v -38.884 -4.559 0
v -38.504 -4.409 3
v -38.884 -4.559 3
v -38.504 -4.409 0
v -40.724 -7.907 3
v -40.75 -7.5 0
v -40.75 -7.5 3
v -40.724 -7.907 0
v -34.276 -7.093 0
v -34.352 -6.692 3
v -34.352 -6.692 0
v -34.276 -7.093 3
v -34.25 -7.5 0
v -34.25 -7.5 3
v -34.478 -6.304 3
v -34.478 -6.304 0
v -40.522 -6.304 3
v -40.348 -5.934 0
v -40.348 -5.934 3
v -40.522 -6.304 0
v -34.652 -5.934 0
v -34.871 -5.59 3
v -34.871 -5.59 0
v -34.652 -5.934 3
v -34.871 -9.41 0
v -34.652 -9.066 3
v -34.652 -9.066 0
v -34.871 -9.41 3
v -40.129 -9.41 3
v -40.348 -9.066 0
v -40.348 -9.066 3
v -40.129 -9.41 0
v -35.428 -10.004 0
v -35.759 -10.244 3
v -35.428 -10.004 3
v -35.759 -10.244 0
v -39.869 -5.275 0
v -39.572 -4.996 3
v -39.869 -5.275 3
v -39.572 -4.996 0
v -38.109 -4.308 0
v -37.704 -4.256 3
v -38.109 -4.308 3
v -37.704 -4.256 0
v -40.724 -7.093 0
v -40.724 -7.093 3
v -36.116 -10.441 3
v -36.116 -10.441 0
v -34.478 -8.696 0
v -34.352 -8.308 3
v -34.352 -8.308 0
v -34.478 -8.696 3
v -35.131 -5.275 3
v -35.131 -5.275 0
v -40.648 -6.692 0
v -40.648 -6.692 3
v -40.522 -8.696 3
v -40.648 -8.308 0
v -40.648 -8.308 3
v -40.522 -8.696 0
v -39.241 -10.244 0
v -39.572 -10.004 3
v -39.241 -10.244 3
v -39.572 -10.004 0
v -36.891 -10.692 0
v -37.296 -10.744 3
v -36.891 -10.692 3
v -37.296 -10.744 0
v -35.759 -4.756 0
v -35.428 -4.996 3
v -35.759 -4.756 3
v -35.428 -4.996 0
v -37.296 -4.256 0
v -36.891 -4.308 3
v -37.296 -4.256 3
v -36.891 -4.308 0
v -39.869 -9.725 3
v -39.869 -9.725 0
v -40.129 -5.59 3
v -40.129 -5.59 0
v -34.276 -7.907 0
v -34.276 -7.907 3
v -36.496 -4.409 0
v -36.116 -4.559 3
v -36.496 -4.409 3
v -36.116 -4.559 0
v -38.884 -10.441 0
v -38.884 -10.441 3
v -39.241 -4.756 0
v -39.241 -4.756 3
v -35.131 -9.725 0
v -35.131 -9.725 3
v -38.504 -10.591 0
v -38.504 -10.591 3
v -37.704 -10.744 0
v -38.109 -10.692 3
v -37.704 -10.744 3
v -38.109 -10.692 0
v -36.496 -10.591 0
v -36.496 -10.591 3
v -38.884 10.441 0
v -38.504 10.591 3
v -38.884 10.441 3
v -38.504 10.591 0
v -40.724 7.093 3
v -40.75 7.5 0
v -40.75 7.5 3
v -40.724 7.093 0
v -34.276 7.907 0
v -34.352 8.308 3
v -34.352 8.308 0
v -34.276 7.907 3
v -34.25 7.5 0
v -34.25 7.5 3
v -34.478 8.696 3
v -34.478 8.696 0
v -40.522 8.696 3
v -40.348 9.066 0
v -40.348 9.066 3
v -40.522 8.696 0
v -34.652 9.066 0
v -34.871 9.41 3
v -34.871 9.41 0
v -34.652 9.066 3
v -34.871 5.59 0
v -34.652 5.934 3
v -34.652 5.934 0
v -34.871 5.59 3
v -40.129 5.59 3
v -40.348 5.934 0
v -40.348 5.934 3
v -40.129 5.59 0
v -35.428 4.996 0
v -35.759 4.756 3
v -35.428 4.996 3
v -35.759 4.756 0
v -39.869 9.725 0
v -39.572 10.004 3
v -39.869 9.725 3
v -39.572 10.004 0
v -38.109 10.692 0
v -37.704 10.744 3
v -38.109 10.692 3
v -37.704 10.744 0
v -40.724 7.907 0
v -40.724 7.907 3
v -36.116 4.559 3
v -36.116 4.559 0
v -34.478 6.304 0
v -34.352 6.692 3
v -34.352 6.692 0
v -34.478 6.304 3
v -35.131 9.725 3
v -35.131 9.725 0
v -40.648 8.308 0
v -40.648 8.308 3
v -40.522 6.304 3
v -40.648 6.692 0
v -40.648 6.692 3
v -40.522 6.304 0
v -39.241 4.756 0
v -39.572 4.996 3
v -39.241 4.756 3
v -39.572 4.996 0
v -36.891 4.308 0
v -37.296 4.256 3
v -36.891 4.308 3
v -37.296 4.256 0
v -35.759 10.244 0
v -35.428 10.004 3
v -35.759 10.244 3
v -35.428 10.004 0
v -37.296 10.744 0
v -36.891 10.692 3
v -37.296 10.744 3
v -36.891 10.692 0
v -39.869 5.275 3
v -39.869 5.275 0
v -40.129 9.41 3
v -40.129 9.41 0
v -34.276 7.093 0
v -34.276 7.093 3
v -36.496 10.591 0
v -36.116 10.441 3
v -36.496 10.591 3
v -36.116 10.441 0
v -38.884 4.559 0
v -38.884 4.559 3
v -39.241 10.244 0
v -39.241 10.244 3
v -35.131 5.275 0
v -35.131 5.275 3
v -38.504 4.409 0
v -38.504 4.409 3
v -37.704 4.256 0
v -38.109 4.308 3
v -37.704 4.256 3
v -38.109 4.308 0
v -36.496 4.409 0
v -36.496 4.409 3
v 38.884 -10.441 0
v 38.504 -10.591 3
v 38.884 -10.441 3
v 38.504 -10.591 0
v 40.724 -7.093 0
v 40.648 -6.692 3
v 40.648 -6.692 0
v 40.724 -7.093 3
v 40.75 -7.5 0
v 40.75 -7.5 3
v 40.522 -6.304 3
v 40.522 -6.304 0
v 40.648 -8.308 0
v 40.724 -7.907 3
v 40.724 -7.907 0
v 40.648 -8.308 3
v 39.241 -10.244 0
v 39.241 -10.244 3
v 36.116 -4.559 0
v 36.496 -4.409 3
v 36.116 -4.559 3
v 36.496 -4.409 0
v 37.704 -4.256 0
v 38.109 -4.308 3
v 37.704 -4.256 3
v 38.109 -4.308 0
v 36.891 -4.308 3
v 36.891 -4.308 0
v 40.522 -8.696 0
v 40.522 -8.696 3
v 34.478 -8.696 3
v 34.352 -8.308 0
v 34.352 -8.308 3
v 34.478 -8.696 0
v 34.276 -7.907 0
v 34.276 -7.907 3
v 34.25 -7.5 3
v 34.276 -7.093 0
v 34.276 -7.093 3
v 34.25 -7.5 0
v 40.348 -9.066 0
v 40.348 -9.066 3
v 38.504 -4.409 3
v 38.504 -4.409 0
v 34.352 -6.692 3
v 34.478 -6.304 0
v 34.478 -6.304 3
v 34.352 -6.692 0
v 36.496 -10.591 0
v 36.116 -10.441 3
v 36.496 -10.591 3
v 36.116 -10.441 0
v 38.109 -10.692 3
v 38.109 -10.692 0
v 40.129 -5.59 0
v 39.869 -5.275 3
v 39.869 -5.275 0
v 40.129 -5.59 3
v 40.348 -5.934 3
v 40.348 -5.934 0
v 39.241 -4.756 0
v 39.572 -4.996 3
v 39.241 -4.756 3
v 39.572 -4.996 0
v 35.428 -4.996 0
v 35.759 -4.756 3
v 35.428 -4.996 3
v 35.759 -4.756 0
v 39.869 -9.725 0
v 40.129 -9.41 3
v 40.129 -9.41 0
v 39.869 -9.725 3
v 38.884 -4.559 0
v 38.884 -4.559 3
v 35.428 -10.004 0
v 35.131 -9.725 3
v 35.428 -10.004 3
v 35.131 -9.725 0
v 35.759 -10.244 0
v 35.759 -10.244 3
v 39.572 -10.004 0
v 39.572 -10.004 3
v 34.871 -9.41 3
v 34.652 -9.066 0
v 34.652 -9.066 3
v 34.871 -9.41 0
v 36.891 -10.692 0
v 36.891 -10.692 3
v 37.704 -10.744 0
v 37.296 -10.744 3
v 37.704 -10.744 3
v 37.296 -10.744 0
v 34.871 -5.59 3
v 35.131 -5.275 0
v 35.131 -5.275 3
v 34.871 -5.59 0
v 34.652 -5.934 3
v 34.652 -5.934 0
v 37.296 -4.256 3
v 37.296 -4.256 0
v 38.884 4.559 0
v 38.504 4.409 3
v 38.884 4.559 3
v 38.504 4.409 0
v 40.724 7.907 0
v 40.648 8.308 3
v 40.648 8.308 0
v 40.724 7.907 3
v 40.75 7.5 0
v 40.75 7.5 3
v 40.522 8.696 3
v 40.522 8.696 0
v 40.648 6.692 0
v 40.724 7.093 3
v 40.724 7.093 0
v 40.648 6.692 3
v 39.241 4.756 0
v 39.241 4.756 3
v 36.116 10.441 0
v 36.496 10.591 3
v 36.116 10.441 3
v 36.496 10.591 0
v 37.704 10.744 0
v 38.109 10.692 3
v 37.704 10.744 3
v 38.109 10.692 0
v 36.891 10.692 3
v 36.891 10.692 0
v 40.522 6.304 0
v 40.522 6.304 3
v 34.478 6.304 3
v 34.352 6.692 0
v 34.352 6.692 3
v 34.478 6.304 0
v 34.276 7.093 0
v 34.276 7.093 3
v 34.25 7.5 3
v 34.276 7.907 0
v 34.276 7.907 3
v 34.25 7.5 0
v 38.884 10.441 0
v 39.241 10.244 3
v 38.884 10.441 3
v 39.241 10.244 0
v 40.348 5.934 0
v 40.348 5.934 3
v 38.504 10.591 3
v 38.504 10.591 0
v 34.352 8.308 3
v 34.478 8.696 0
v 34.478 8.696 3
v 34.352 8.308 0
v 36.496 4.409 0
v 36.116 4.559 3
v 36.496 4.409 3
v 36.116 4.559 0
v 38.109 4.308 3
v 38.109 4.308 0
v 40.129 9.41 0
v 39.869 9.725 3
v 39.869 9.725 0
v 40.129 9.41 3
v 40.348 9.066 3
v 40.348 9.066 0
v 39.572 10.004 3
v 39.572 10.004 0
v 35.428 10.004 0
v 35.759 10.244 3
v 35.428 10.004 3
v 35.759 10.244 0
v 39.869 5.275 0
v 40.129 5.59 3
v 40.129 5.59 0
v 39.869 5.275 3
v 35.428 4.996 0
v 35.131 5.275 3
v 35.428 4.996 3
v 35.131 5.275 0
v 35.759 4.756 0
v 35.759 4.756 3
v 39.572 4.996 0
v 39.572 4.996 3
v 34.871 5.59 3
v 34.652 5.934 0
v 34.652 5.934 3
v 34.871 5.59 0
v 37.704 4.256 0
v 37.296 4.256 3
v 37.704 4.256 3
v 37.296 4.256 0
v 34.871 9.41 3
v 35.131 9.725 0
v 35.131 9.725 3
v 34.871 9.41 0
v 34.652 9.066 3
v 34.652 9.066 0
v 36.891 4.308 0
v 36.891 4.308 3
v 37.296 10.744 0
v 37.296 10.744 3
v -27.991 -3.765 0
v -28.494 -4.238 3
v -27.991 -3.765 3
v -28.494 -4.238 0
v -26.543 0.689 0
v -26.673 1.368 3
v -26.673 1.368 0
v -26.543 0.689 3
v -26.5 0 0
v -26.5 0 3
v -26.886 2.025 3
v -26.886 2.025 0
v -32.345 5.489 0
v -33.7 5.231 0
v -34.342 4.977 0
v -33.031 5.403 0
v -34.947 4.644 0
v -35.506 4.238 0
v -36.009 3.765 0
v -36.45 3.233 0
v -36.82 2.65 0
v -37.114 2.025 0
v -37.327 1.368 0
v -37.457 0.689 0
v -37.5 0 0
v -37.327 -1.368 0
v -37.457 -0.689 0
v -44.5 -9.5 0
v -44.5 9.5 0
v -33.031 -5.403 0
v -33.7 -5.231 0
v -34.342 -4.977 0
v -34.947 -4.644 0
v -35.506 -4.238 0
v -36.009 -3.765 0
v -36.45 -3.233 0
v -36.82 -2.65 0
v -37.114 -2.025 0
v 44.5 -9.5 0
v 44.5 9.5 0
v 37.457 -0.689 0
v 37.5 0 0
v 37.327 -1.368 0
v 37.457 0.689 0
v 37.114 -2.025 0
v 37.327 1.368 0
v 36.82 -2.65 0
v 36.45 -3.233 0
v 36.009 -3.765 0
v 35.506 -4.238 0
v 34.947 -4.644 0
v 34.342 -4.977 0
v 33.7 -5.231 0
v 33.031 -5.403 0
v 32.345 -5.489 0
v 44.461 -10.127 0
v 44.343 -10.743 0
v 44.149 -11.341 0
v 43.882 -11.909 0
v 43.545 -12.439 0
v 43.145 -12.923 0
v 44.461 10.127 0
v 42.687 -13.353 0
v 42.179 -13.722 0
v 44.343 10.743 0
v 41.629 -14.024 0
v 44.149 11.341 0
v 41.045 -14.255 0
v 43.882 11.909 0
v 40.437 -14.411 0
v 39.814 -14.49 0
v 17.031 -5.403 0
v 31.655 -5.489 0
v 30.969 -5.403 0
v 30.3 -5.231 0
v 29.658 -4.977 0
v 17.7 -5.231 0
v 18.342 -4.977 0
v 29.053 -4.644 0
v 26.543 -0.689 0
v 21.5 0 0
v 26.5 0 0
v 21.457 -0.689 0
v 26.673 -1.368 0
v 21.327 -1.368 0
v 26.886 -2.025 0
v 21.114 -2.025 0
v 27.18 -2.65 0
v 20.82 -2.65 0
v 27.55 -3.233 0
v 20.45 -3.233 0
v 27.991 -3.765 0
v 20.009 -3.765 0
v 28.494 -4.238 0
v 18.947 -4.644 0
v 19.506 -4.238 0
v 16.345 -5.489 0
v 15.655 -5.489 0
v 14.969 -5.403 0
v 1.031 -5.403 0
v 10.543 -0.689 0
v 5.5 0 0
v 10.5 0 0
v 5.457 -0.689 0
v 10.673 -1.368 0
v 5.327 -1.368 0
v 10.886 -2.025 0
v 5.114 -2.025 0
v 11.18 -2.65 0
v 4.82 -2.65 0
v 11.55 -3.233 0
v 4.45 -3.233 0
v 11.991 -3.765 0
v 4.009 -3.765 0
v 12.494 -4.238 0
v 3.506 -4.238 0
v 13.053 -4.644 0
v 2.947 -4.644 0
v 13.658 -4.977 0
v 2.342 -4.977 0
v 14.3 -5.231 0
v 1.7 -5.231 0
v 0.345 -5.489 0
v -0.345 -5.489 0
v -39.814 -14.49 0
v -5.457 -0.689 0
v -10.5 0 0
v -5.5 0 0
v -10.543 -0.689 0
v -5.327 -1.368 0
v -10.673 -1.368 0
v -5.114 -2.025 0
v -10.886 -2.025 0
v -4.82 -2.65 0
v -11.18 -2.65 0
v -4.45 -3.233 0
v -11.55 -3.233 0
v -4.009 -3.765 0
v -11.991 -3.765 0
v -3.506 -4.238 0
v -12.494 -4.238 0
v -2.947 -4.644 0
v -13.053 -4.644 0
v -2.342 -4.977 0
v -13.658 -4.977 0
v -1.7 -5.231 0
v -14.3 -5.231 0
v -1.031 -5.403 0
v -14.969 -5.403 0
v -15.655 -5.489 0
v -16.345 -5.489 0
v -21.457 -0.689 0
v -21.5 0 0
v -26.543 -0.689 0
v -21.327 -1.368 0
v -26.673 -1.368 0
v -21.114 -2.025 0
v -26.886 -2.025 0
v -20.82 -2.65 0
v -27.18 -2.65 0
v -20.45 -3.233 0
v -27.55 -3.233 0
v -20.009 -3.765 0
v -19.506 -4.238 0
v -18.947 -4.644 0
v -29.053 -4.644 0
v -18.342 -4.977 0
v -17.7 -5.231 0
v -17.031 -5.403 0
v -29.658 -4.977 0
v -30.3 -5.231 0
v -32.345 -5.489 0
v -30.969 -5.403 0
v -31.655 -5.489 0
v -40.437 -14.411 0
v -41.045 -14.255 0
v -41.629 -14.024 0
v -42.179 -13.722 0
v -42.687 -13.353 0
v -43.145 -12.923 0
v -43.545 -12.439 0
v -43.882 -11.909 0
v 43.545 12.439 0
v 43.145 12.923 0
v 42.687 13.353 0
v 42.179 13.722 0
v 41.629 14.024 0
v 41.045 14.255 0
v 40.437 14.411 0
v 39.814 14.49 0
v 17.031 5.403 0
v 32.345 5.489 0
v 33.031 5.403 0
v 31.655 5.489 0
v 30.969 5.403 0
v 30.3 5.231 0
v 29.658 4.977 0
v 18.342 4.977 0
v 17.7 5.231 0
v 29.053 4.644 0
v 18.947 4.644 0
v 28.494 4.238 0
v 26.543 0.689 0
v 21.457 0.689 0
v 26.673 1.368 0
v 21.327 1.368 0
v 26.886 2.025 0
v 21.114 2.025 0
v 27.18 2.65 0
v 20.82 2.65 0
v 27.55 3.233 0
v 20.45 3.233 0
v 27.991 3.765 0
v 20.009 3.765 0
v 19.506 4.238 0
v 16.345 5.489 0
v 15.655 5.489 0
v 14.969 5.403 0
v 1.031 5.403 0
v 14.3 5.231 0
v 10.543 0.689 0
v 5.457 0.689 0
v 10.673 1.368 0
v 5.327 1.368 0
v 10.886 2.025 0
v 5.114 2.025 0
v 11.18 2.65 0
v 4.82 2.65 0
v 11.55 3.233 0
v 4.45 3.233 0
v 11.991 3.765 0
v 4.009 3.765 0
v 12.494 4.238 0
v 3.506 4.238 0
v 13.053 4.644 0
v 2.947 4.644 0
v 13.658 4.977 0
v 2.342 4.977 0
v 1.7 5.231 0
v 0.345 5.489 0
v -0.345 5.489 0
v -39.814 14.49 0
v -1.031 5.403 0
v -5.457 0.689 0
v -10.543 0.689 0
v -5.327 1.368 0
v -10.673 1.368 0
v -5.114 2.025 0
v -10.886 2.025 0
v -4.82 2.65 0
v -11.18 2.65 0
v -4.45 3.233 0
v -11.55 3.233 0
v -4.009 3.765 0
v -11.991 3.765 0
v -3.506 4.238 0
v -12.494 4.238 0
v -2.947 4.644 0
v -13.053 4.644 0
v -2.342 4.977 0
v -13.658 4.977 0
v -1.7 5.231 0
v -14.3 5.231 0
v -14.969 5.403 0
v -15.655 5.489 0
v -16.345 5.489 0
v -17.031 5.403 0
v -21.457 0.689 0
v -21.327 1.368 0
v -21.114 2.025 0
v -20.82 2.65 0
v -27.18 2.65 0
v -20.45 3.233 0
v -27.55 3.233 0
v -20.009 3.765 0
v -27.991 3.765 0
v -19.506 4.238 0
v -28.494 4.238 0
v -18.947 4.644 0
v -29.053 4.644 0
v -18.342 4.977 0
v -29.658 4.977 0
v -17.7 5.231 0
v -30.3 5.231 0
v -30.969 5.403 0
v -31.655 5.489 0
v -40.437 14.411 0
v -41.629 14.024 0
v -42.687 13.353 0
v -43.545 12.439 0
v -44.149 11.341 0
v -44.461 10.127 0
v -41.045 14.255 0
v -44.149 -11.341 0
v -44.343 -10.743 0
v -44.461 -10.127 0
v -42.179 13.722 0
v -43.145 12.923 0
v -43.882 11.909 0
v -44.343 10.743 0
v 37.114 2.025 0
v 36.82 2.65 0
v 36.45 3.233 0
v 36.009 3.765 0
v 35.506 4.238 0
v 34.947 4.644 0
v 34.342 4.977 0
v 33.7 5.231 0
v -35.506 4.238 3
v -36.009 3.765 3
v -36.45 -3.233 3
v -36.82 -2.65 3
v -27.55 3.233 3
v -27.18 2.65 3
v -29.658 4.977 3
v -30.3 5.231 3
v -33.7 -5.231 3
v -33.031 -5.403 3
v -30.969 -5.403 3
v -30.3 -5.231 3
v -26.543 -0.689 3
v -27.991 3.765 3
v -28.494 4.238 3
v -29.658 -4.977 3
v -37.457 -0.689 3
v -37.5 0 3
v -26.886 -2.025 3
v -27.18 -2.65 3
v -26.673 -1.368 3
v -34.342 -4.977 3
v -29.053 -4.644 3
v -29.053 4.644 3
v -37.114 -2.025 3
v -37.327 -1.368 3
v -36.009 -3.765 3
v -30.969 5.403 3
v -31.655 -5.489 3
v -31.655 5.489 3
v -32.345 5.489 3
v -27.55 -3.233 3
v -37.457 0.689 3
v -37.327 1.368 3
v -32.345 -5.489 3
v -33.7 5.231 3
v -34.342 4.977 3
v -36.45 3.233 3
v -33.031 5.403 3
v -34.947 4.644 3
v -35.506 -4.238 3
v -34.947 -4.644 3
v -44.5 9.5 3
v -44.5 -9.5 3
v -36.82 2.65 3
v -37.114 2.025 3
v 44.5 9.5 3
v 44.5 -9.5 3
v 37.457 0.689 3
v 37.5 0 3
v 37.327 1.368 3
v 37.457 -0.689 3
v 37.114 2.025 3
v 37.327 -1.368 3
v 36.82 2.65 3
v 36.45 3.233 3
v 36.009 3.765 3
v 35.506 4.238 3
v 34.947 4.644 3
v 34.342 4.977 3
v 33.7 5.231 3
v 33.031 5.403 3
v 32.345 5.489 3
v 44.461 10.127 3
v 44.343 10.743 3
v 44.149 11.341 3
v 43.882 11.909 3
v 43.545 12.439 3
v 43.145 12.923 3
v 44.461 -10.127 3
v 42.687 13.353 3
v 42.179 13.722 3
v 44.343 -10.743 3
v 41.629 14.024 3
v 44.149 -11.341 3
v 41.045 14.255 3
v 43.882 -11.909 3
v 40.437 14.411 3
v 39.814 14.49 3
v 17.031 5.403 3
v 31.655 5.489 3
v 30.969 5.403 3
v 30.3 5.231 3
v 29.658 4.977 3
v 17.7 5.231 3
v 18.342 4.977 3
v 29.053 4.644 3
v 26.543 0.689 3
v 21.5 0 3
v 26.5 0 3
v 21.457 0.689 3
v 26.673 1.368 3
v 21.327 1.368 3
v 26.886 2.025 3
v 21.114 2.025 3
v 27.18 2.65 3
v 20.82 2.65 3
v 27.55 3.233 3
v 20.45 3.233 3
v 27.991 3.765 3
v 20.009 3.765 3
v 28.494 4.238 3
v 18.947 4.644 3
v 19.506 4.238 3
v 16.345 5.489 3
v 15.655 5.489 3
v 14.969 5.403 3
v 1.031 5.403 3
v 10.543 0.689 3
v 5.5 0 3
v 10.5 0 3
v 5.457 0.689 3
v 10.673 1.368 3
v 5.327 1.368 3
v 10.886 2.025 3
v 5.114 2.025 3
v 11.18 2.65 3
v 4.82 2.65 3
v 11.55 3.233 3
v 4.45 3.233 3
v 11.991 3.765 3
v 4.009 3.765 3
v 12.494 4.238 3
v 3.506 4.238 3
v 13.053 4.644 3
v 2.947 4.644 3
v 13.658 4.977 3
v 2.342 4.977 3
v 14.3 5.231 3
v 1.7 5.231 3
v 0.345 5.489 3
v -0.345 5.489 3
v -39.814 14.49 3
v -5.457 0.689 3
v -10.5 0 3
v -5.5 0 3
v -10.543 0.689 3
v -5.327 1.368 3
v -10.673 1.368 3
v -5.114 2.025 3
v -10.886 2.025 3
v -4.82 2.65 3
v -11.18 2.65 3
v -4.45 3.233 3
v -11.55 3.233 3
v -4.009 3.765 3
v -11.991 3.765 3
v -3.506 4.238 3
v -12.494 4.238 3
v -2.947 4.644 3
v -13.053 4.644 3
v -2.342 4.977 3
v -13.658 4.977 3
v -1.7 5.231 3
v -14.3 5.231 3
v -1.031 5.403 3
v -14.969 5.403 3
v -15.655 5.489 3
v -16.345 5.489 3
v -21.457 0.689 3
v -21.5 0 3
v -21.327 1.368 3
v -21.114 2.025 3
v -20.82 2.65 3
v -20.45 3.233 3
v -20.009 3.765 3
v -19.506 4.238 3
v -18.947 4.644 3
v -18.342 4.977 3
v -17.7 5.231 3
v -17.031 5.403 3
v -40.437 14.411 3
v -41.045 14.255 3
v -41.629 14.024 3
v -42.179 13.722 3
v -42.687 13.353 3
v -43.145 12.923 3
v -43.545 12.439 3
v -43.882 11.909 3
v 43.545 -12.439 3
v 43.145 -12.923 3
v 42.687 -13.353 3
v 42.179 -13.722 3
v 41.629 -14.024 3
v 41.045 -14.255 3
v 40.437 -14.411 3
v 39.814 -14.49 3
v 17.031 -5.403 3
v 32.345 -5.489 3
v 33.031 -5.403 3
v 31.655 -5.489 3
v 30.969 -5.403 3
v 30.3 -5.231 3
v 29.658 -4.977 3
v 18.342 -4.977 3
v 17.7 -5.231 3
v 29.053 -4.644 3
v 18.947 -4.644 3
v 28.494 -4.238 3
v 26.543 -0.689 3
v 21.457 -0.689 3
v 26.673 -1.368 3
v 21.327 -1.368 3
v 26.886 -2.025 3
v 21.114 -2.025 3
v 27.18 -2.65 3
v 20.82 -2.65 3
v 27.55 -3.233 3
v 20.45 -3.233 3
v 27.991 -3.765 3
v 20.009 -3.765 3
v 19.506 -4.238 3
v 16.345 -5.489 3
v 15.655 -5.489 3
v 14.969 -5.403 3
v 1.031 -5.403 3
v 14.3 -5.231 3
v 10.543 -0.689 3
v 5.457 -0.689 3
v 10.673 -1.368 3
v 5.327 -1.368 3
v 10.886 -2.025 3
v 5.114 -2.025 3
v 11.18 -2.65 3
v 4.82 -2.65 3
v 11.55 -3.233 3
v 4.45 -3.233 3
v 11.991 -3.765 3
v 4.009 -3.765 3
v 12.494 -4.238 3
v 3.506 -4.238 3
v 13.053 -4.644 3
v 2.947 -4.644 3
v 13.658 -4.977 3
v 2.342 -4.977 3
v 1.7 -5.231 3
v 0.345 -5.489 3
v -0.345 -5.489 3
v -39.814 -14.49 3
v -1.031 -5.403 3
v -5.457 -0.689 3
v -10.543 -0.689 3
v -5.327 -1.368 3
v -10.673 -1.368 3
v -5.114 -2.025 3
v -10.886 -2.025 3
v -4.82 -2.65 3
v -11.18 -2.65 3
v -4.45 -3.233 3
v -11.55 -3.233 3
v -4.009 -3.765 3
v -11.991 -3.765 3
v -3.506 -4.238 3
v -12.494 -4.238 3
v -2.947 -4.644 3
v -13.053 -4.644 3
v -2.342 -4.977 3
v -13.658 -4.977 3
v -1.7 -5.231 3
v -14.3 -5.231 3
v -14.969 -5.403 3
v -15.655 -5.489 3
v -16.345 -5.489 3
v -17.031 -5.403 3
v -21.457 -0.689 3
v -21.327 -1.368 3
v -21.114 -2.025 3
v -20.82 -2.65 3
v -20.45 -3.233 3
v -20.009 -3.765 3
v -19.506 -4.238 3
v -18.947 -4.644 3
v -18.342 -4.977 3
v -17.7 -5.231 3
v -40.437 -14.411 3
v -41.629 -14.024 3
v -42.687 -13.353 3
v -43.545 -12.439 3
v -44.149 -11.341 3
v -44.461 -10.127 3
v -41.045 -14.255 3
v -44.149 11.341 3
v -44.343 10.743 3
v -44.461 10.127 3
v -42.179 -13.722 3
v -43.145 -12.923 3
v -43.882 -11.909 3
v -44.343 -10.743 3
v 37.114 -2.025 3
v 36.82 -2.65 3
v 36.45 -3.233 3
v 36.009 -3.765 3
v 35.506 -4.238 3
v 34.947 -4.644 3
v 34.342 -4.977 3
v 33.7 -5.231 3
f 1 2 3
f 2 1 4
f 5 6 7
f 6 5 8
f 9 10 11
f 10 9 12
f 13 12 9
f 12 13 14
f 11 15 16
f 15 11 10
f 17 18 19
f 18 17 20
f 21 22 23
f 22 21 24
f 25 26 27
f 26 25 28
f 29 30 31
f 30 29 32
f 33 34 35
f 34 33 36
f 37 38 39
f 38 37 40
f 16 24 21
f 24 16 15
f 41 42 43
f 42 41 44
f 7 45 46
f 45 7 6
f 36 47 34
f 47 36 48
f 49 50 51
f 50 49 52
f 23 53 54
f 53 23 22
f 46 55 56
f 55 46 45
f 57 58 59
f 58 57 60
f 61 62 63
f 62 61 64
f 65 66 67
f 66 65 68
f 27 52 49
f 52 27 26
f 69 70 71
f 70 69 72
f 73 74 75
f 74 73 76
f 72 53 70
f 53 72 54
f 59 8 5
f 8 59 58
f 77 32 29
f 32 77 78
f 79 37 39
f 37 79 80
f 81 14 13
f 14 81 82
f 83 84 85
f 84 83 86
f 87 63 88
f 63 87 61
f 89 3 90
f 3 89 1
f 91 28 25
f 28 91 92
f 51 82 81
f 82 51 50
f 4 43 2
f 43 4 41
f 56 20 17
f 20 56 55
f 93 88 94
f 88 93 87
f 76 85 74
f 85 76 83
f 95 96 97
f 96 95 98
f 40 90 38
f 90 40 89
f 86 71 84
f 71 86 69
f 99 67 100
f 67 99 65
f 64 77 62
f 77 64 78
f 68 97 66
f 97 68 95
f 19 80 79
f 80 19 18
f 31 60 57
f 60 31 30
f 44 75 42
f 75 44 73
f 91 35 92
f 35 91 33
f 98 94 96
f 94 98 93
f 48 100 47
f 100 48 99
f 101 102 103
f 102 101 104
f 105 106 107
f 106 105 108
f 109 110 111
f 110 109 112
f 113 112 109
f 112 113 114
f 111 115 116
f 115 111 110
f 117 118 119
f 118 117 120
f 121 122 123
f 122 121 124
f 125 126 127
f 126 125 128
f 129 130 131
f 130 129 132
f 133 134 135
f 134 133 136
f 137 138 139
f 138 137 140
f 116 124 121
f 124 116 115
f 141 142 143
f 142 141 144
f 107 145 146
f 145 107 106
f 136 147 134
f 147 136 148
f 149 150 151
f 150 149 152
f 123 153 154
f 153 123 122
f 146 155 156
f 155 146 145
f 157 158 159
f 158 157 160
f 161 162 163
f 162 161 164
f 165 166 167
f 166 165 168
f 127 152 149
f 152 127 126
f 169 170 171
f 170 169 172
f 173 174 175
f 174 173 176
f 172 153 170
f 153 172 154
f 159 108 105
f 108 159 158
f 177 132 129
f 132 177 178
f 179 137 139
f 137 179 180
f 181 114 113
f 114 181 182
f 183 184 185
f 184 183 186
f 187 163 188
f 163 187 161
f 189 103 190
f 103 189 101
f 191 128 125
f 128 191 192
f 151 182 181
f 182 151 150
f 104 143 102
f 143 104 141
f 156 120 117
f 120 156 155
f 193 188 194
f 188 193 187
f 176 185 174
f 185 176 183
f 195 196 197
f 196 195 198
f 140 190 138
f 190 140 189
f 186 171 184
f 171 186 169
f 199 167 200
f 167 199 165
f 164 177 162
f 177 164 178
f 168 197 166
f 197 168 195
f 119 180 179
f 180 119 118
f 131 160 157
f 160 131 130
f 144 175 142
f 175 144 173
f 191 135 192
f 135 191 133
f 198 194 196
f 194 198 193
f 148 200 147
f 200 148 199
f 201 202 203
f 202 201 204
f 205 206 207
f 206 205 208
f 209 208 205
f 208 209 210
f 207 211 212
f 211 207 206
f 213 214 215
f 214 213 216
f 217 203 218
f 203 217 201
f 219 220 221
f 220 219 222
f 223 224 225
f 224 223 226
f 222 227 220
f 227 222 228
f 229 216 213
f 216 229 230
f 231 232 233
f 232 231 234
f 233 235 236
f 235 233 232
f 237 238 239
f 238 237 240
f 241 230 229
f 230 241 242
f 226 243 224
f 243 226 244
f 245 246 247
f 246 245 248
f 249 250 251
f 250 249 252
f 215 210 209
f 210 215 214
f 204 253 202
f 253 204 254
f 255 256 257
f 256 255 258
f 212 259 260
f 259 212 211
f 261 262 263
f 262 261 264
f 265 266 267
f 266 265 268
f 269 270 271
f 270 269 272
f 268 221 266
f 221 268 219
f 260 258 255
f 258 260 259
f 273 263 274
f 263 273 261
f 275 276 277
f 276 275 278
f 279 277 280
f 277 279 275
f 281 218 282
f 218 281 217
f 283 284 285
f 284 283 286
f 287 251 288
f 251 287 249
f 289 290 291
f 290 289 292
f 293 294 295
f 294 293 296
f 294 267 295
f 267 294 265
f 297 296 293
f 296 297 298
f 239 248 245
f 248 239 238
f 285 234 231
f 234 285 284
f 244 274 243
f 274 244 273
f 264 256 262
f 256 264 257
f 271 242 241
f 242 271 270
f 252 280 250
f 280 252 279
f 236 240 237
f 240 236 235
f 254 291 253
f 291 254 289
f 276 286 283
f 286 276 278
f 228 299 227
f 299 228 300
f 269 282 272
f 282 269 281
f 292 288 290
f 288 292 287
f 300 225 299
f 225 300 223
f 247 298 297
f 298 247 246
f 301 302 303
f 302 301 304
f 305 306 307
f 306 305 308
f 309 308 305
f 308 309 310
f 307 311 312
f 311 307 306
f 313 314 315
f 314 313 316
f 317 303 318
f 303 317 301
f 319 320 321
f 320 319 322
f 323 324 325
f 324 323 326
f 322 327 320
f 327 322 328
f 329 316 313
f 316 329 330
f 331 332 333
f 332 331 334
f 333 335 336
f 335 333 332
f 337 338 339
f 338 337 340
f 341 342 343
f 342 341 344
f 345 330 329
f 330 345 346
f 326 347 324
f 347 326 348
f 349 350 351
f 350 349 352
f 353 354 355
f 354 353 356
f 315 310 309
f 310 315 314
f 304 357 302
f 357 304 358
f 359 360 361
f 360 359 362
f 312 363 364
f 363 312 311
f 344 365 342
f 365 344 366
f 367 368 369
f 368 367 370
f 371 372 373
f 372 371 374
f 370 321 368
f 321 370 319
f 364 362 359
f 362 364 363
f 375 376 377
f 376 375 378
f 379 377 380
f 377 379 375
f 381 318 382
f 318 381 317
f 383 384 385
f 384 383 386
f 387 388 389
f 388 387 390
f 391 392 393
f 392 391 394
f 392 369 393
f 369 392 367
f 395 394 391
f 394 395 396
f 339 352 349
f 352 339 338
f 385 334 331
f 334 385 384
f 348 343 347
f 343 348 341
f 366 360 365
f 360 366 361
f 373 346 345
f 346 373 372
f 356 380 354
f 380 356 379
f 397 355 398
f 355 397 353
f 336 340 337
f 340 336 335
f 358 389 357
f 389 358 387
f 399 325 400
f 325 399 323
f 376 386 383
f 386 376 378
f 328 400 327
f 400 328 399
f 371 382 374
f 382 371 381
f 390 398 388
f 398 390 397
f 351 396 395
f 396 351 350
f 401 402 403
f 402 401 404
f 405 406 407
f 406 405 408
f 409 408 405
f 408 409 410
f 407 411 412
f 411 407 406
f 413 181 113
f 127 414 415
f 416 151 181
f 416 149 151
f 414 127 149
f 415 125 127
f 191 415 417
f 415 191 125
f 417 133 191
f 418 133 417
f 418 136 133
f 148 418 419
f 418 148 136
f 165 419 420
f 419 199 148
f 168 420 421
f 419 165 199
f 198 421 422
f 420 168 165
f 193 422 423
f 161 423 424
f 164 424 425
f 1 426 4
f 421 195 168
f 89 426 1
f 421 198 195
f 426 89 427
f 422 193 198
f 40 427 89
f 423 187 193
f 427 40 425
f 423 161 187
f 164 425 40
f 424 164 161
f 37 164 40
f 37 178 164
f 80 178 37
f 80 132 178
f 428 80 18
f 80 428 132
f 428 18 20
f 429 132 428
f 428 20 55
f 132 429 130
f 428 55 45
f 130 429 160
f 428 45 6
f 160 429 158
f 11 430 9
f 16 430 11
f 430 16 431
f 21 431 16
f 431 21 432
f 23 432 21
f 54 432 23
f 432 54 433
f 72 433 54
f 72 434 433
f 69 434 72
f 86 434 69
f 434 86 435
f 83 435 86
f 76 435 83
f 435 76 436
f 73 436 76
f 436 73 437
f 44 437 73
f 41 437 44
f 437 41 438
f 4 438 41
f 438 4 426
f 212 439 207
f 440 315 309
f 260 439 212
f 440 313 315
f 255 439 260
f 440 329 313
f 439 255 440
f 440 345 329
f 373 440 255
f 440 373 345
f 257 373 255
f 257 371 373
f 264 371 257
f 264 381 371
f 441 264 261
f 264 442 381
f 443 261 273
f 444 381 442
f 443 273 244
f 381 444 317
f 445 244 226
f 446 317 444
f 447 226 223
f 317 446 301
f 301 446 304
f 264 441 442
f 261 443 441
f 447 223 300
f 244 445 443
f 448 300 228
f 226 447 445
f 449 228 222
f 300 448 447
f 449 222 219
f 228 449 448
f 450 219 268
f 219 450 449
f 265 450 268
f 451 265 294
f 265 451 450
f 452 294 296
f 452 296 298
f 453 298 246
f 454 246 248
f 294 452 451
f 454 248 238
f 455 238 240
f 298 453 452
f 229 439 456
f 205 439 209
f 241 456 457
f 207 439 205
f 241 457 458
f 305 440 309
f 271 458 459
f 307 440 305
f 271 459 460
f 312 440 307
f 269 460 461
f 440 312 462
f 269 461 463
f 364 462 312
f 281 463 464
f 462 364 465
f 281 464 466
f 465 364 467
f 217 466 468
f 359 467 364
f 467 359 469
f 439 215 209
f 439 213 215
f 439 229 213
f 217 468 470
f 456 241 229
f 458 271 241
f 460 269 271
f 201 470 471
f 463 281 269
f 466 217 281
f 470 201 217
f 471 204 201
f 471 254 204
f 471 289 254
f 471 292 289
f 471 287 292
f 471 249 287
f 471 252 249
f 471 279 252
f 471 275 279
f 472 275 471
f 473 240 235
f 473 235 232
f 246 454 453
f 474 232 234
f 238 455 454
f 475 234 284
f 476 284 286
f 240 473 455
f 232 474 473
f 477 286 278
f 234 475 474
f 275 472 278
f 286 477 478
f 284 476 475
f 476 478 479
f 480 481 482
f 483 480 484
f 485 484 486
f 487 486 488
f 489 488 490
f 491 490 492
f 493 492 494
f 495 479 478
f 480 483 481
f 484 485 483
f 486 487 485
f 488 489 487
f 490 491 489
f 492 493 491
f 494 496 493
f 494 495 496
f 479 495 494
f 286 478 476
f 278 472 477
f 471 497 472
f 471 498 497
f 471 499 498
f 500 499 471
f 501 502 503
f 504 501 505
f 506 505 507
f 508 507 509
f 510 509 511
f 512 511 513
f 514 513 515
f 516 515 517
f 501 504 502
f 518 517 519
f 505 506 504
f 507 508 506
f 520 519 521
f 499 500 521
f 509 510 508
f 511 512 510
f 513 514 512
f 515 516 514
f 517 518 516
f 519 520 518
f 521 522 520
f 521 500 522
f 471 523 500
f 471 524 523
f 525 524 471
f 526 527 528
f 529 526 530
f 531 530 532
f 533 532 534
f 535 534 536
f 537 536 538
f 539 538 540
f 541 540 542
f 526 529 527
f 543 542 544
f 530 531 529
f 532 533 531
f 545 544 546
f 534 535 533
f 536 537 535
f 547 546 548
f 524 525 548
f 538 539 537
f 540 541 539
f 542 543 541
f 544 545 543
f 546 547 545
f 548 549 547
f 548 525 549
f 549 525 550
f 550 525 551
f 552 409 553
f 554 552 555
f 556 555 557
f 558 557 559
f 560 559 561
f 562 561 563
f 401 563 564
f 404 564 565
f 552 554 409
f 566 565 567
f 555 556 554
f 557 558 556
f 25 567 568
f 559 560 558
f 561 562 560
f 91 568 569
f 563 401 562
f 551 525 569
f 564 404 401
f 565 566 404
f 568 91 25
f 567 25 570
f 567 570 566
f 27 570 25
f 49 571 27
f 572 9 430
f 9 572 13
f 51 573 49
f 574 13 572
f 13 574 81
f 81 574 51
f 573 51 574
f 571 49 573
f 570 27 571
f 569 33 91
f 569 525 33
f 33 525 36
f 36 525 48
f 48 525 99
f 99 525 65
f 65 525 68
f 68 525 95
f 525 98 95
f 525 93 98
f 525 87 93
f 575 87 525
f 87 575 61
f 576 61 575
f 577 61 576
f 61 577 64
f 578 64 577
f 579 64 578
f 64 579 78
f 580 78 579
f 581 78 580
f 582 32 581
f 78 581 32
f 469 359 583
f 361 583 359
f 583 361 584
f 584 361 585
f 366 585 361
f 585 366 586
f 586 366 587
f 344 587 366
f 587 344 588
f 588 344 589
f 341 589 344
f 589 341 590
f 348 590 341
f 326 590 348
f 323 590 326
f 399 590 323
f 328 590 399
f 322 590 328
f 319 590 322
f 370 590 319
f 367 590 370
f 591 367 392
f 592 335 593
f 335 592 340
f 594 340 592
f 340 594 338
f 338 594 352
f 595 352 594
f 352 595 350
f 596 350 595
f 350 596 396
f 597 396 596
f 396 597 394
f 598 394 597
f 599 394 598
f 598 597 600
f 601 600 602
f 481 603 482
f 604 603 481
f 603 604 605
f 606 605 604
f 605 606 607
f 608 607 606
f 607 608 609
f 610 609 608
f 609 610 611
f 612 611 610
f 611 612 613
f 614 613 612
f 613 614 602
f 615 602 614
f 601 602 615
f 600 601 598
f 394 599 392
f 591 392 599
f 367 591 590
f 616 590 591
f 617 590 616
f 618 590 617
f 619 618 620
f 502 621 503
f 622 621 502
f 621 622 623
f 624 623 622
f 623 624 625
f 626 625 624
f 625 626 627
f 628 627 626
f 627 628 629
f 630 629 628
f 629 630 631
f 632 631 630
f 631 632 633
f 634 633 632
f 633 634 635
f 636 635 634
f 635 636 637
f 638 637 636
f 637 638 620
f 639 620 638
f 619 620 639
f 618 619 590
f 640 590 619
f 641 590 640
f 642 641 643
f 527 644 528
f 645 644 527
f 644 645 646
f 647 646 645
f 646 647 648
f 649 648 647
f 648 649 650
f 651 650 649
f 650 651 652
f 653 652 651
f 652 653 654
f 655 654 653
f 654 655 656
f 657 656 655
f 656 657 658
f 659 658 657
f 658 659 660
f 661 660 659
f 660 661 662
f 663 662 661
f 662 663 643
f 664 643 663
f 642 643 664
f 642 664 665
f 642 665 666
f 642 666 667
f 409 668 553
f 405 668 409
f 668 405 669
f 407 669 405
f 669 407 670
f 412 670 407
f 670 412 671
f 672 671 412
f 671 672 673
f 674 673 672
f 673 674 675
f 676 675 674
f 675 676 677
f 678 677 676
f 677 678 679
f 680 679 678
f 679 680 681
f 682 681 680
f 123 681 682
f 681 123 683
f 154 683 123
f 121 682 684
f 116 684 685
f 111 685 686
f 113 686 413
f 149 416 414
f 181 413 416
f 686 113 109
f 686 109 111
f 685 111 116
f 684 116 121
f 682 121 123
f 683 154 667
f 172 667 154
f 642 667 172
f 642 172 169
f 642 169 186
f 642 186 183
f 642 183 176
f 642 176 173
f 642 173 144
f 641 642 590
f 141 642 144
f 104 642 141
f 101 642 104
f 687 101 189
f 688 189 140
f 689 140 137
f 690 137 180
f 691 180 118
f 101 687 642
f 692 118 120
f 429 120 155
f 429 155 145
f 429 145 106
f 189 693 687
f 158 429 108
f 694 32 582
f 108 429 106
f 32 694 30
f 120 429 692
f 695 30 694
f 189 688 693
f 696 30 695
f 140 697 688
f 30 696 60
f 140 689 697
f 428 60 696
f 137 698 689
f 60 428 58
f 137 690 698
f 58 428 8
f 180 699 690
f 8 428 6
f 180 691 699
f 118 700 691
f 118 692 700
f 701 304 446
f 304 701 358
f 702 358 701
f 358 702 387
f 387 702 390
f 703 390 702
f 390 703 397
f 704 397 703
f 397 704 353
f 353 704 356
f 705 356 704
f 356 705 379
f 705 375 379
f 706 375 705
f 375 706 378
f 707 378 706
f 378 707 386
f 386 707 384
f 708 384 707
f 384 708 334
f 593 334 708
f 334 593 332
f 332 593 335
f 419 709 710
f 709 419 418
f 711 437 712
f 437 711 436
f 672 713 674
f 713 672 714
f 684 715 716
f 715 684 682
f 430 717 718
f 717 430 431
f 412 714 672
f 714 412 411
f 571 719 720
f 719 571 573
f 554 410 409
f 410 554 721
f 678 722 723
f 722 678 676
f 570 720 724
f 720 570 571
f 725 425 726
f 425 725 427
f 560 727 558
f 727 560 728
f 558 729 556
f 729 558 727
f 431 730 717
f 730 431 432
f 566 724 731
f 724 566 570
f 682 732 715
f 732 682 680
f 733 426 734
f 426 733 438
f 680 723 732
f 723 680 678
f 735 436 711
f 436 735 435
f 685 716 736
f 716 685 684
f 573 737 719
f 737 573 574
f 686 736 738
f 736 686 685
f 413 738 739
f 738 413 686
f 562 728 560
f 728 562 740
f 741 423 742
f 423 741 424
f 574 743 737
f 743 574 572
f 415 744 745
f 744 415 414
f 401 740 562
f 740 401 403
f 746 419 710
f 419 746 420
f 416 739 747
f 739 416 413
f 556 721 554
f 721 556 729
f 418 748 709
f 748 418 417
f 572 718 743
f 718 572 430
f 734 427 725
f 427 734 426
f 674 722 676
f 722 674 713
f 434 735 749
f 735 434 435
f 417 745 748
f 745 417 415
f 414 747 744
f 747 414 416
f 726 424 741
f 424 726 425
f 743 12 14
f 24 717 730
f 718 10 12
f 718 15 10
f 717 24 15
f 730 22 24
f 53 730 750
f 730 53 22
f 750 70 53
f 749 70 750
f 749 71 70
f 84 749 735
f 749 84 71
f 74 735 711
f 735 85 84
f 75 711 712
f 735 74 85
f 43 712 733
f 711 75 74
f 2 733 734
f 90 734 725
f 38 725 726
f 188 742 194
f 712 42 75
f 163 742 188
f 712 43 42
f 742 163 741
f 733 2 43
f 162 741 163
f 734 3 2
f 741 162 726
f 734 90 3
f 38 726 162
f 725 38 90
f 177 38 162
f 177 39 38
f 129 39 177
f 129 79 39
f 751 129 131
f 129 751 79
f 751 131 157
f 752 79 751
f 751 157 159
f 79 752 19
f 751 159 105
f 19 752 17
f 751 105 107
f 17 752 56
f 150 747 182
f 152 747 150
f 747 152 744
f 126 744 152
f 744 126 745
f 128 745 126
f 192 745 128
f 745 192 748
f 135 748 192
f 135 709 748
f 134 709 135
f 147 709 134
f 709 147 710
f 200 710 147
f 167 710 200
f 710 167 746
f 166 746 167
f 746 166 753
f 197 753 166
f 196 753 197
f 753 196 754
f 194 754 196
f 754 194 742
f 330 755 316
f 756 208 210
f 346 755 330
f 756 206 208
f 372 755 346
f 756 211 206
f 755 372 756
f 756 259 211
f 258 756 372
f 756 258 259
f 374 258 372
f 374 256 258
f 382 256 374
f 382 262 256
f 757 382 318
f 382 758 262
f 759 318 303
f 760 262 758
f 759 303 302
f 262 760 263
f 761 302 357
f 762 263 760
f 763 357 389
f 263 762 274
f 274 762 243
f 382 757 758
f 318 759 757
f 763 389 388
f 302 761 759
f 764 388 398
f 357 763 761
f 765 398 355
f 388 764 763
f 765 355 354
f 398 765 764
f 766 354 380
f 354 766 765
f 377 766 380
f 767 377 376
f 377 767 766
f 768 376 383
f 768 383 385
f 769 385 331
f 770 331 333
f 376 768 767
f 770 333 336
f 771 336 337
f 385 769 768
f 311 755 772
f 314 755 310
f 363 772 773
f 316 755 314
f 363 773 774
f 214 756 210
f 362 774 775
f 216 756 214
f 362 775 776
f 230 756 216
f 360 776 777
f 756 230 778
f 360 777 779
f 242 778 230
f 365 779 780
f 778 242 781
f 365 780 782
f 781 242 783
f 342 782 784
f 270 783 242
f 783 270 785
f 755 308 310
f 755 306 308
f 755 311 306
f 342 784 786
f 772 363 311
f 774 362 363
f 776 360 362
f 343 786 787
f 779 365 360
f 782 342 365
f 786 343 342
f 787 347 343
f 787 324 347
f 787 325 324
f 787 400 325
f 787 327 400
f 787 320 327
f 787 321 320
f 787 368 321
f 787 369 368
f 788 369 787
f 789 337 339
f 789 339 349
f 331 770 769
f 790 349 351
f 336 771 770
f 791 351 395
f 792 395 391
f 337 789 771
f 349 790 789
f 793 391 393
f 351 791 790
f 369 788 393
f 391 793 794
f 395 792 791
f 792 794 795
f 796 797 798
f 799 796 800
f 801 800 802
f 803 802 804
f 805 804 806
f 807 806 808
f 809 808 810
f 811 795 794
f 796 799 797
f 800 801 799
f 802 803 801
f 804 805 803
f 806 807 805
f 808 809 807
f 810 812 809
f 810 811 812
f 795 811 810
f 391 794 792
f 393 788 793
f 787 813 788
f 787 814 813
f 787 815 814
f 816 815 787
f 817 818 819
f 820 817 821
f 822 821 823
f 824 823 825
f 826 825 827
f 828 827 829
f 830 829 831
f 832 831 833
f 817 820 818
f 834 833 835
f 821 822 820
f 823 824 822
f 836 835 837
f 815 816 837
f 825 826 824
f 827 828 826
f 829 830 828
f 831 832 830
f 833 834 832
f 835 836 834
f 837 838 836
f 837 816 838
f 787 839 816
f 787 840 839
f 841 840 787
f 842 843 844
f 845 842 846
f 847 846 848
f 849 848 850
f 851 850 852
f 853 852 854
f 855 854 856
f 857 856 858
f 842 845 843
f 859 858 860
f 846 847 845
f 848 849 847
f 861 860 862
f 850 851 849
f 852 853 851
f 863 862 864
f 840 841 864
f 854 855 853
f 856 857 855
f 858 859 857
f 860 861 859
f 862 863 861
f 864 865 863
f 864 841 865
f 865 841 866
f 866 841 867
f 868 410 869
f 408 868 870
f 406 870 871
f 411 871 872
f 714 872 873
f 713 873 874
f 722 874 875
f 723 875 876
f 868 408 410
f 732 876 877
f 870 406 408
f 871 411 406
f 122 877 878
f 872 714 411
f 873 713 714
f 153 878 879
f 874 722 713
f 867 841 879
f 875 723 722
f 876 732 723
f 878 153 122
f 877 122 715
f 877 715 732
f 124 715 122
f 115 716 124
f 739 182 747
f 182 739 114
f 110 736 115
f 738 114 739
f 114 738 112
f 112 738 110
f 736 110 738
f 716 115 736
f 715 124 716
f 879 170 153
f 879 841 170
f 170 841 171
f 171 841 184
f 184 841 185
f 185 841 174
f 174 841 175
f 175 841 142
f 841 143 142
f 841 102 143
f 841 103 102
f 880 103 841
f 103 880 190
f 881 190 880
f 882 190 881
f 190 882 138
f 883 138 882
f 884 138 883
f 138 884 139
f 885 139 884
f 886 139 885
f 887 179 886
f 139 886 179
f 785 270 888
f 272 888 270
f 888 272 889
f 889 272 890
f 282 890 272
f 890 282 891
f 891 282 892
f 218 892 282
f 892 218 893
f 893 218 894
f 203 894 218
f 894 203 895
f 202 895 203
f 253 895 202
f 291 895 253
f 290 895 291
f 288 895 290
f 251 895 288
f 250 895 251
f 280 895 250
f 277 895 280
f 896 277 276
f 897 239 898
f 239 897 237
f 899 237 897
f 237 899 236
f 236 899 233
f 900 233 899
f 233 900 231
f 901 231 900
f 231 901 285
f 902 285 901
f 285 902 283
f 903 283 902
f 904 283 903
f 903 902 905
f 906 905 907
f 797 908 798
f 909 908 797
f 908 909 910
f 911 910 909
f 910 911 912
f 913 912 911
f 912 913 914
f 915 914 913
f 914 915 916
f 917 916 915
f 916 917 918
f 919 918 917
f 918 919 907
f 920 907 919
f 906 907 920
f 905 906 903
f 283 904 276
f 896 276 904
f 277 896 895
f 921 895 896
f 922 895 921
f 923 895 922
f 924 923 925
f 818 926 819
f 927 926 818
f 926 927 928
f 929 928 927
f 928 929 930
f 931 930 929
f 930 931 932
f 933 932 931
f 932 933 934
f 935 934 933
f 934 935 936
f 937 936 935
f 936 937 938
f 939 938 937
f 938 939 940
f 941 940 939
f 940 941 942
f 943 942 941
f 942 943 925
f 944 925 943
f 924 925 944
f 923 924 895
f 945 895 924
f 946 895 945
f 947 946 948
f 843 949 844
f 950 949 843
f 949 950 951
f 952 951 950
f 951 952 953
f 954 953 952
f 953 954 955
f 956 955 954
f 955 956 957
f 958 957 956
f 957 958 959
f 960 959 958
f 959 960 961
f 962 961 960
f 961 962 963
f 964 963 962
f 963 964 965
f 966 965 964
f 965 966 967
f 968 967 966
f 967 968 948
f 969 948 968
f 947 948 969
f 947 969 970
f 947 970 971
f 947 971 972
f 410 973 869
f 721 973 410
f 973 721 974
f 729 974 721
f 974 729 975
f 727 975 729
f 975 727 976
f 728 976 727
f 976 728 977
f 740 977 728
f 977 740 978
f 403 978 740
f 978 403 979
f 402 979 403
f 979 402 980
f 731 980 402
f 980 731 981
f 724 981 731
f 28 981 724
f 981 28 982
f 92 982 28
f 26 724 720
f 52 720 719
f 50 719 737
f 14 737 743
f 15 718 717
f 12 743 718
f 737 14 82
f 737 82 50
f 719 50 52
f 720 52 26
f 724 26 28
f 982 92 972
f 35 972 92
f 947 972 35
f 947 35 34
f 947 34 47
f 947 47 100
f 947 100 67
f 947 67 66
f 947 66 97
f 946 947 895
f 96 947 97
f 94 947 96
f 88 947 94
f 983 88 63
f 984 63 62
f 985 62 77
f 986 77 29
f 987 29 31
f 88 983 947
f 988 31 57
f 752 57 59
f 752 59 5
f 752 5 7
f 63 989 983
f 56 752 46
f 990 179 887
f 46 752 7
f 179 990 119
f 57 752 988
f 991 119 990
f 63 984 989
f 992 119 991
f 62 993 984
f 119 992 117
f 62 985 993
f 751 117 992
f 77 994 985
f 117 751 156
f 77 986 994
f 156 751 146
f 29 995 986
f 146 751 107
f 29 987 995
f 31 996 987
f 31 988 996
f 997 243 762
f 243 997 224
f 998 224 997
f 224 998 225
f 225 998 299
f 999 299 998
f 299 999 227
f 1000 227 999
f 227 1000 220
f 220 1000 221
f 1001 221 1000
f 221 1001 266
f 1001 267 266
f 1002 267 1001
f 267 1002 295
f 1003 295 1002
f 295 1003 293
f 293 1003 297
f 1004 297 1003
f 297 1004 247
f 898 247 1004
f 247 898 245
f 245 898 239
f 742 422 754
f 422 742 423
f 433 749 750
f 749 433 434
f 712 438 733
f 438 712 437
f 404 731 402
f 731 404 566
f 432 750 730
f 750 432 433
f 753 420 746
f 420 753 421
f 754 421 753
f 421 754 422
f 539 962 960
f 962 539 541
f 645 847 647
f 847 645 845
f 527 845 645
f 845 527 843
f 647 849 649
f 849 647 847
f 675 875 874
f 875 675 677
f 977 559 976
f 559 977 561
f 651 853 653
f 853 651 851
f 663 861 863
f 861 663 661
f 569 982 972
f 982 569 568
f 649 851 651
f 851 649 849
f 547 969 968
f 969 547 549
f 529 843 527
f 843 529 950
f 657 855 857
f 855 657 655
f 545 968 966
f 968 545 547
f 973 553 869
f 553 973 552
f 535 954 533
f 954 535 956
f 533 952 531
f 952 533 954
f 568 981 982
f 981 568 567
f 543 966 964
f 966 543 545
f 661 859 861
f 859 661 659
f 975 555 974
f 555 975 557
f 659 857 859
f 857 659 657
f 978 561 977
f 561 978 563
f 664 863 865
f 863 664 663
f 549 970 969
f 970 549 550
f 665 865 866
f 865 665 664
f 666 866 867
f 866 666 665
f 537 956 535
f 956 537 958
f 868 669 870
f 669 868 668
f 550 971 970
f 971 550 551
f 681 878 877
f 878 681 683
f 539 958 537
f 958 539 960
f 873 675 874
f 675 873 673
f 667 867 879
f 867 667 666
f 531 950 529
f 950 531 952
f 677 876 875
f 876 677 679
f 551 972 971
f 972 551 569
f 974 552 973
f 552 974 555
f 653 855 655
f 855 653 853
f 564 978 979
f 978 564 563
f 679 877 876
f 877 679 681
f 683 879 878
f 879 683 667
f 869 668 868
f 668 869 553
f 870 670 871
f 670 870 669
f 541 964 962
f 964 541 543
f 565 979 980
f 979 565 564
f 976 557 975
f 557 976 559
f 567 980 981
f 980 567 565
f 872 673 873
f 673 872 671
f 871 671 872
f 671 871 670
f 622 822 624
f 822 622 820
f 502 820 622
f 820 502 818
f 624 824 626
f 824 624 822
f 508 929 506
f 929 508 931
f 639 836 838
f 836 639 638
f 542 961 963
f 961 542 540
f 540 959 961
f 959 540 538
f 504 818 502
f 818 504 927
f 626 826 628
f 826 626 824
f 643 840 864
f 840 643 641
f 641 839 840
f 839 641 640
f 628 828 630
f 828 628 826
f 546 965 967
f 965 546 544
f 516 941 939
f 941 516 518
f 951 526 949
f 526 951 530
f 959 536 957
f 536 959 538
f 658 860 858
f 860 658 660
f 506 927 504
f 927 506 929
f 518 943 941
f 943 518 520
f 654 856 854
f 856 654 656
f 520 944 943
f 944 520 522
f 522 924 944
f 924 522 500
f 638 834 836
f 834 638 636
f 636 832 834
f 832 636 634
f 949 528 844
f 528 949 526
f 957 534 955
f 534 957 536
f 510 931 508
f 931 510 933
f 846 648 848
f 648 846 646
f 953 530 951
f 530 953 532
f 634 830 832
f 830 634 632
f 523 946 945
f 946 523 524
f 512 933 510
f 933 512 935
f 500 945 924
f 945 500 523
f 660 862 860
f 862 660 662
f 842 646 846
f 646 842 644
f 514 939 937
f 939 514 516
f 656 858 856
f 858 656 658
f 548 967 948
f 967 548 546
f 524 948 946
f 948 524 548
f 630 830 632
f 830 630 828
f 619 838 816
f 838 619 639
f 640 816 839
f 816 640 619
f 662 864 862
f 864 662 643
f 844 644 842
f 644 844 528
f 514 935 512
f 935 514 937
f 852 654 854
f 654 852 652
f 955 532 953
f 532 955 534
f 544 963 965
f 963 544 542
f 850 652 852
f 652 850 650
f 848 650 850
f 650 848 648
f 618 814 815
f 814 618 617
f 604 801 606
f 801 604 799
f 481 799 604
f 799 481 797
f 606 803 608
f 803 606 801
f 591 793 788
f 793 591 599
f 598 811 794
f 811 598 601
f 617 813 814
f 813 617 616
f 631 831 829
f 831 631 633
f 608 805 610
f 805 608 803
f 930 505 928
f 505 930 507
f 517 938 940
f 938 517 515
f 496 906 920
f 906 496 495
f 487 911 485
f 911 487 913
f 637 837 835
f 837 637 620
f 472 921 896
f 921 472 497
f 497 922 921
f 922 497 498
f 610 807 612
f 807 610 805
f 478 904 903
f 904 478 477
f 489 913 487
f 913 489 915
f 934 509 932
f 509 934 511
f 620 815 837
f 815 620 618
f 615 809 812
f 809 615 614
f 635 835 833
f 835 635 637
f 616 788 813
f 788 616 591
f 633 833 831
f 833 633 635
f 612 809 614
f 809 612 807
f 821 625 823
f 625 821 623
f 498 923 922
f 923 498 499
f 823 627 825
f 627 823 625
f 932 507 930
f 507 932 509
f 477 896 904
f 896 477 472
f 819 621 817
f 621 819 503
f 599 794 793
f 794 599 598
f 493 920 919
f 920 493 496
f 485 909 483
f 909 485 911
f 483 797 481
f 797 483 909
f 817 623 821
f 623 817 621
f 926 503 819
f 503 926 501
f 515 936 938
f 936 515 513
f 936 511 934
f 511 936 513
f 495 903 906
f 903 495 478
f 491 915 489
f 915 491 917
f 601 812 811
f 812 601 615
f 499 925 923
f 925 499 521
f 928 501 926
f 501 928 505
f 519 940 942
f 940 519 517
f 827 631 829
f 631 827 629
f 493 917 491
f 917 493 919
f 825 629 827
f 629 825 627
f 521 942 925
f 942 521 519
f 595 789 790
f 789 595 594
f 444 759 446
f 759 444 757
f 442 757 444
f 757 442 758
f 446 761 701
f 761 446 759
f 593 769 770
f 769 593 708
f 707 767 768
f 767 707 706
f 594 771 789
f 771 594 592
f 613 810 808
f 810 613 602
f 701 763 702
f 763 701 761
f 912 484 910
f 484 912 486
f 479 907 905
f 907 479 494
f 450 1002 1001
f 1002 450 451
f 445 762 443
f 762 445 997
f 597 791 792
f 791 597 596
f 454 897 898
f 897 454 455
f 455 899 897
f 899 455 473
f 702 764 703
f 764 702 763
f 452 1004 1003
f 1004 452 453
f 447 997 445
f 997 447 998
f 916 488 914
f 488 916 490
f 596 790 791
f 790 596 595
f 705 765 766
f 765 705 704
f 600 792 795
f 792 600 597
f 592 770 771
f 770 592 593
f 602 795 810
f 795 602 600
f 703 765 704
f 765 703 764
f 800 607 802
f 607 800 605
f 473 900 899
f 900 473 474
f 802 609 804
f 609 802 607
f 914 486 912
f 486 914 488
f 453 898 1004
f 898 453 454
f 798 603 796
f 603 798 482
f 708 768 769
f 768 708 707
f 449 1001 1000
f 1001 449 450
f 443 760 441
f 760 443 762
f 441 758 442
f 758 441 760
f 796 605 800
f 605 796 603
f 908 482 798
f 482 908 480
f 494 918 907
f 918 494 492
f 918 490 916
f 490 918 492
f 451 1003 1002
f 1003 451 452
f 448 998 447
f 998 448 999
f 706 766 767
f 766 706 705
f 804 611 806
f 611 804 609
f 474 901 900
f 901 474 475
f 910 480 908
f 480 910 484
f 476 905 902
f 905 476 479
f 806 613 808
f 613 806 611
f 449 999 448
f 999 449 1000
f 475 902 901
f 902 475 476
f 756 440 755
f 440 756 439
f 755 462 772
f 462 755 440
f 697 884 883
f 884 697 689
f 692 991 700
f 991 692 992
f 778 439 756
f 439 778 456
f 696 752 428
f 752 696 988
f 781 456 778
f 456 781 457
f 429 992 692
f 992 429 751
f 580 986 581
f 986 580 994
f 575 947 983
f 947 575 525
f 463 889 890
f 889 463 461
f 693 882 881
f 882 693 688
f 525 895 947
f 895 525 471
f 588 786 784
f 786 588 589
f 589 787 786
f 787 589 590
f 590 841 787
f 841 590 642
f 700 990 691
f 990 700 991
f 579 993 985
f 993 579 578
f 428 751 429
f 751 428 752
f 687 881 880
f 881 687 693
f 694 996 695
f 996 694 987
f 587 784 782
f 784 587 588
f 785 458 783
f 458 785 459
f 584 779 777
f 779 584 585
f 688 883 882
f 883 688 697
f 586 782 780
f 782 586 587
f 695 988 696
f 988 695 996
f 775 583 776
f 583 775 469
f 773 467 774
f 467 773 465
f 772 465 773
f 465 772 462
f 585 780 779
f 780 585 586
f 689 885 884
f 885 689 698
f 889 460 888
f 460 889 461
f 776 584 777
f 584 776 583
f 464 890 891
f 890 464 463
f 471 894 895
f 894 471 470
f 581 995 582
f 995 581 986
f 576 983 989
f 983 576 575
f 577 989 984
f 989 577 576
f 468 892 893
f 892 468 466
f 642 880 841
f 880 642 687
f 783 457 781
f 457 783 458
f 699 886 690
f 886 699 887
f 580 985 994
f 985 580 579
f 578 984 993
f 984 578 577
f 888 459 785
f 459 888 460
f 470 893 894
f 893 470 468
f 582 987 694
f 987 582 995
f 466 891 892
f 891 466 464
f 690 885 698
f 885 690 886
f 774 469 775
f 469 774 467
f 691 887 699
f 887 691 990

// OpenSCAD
$fn = 50;


difference() {
	union() {
		hull() {
			translate(v = [-39.5000000000, 9.5000000000, 0]) {
				cylinder(h = 3, r = 5);
			}
			translate(v = [39.5000000000, 9.5000000000, 0]) {
				cylinder(h = 3, r = 5);
			}
			translate(v = [-39.5000000000, -9.5000000000, 0]) {
				cylinder(h = 3, r = 5);
			}
			translate(v = [39.5000000000, -9.5000000000, 0]) {
				cylinder(h = 3, r = 5);
			}
		}
	}
	union() {
		#translate(v = [-37.5000000000, -7.5000000000, -100.0000000000]) {
			cylinder(h = 200, r = 3.2500000000);
		}
		#translate(v = [-37.5000000000, 7.5000000000, -100.0000000000]) {
			cylinder(h = 200, r = 3.2500000000);
		}
		#translate(v = [37.5000000000, -7.5000000000, -100.0000000000]) {
			cylinder(h = 200, r = 3.2500000000);
		}
		#translate(v = [37.5000000000, 7.5000000000, -100.0000000000]) {
			cylinder(h = 200, r = 3.2500000000);
		}
		#translate(v = [-32.0000000000, 0, 0]) {
			cylinder(h = 3, r = 5.5000000000);
		}
		#translate(v = [-16.0000000000, 0, 0]) {
			cylinder(h = 3, r = 5.5000000000);
		}
		#cylinder(h = 3, r = 5.5000000000);
		#translate(v = [16.0000000000, 0, 0]) {
			cylinder(h = 3, r = 5.5000000000);
		}
		#translate(v = [32.0000000000, 0, 0]) {
			cylinder(h = 3, r = 5.5000000000);
		}
	}
}
